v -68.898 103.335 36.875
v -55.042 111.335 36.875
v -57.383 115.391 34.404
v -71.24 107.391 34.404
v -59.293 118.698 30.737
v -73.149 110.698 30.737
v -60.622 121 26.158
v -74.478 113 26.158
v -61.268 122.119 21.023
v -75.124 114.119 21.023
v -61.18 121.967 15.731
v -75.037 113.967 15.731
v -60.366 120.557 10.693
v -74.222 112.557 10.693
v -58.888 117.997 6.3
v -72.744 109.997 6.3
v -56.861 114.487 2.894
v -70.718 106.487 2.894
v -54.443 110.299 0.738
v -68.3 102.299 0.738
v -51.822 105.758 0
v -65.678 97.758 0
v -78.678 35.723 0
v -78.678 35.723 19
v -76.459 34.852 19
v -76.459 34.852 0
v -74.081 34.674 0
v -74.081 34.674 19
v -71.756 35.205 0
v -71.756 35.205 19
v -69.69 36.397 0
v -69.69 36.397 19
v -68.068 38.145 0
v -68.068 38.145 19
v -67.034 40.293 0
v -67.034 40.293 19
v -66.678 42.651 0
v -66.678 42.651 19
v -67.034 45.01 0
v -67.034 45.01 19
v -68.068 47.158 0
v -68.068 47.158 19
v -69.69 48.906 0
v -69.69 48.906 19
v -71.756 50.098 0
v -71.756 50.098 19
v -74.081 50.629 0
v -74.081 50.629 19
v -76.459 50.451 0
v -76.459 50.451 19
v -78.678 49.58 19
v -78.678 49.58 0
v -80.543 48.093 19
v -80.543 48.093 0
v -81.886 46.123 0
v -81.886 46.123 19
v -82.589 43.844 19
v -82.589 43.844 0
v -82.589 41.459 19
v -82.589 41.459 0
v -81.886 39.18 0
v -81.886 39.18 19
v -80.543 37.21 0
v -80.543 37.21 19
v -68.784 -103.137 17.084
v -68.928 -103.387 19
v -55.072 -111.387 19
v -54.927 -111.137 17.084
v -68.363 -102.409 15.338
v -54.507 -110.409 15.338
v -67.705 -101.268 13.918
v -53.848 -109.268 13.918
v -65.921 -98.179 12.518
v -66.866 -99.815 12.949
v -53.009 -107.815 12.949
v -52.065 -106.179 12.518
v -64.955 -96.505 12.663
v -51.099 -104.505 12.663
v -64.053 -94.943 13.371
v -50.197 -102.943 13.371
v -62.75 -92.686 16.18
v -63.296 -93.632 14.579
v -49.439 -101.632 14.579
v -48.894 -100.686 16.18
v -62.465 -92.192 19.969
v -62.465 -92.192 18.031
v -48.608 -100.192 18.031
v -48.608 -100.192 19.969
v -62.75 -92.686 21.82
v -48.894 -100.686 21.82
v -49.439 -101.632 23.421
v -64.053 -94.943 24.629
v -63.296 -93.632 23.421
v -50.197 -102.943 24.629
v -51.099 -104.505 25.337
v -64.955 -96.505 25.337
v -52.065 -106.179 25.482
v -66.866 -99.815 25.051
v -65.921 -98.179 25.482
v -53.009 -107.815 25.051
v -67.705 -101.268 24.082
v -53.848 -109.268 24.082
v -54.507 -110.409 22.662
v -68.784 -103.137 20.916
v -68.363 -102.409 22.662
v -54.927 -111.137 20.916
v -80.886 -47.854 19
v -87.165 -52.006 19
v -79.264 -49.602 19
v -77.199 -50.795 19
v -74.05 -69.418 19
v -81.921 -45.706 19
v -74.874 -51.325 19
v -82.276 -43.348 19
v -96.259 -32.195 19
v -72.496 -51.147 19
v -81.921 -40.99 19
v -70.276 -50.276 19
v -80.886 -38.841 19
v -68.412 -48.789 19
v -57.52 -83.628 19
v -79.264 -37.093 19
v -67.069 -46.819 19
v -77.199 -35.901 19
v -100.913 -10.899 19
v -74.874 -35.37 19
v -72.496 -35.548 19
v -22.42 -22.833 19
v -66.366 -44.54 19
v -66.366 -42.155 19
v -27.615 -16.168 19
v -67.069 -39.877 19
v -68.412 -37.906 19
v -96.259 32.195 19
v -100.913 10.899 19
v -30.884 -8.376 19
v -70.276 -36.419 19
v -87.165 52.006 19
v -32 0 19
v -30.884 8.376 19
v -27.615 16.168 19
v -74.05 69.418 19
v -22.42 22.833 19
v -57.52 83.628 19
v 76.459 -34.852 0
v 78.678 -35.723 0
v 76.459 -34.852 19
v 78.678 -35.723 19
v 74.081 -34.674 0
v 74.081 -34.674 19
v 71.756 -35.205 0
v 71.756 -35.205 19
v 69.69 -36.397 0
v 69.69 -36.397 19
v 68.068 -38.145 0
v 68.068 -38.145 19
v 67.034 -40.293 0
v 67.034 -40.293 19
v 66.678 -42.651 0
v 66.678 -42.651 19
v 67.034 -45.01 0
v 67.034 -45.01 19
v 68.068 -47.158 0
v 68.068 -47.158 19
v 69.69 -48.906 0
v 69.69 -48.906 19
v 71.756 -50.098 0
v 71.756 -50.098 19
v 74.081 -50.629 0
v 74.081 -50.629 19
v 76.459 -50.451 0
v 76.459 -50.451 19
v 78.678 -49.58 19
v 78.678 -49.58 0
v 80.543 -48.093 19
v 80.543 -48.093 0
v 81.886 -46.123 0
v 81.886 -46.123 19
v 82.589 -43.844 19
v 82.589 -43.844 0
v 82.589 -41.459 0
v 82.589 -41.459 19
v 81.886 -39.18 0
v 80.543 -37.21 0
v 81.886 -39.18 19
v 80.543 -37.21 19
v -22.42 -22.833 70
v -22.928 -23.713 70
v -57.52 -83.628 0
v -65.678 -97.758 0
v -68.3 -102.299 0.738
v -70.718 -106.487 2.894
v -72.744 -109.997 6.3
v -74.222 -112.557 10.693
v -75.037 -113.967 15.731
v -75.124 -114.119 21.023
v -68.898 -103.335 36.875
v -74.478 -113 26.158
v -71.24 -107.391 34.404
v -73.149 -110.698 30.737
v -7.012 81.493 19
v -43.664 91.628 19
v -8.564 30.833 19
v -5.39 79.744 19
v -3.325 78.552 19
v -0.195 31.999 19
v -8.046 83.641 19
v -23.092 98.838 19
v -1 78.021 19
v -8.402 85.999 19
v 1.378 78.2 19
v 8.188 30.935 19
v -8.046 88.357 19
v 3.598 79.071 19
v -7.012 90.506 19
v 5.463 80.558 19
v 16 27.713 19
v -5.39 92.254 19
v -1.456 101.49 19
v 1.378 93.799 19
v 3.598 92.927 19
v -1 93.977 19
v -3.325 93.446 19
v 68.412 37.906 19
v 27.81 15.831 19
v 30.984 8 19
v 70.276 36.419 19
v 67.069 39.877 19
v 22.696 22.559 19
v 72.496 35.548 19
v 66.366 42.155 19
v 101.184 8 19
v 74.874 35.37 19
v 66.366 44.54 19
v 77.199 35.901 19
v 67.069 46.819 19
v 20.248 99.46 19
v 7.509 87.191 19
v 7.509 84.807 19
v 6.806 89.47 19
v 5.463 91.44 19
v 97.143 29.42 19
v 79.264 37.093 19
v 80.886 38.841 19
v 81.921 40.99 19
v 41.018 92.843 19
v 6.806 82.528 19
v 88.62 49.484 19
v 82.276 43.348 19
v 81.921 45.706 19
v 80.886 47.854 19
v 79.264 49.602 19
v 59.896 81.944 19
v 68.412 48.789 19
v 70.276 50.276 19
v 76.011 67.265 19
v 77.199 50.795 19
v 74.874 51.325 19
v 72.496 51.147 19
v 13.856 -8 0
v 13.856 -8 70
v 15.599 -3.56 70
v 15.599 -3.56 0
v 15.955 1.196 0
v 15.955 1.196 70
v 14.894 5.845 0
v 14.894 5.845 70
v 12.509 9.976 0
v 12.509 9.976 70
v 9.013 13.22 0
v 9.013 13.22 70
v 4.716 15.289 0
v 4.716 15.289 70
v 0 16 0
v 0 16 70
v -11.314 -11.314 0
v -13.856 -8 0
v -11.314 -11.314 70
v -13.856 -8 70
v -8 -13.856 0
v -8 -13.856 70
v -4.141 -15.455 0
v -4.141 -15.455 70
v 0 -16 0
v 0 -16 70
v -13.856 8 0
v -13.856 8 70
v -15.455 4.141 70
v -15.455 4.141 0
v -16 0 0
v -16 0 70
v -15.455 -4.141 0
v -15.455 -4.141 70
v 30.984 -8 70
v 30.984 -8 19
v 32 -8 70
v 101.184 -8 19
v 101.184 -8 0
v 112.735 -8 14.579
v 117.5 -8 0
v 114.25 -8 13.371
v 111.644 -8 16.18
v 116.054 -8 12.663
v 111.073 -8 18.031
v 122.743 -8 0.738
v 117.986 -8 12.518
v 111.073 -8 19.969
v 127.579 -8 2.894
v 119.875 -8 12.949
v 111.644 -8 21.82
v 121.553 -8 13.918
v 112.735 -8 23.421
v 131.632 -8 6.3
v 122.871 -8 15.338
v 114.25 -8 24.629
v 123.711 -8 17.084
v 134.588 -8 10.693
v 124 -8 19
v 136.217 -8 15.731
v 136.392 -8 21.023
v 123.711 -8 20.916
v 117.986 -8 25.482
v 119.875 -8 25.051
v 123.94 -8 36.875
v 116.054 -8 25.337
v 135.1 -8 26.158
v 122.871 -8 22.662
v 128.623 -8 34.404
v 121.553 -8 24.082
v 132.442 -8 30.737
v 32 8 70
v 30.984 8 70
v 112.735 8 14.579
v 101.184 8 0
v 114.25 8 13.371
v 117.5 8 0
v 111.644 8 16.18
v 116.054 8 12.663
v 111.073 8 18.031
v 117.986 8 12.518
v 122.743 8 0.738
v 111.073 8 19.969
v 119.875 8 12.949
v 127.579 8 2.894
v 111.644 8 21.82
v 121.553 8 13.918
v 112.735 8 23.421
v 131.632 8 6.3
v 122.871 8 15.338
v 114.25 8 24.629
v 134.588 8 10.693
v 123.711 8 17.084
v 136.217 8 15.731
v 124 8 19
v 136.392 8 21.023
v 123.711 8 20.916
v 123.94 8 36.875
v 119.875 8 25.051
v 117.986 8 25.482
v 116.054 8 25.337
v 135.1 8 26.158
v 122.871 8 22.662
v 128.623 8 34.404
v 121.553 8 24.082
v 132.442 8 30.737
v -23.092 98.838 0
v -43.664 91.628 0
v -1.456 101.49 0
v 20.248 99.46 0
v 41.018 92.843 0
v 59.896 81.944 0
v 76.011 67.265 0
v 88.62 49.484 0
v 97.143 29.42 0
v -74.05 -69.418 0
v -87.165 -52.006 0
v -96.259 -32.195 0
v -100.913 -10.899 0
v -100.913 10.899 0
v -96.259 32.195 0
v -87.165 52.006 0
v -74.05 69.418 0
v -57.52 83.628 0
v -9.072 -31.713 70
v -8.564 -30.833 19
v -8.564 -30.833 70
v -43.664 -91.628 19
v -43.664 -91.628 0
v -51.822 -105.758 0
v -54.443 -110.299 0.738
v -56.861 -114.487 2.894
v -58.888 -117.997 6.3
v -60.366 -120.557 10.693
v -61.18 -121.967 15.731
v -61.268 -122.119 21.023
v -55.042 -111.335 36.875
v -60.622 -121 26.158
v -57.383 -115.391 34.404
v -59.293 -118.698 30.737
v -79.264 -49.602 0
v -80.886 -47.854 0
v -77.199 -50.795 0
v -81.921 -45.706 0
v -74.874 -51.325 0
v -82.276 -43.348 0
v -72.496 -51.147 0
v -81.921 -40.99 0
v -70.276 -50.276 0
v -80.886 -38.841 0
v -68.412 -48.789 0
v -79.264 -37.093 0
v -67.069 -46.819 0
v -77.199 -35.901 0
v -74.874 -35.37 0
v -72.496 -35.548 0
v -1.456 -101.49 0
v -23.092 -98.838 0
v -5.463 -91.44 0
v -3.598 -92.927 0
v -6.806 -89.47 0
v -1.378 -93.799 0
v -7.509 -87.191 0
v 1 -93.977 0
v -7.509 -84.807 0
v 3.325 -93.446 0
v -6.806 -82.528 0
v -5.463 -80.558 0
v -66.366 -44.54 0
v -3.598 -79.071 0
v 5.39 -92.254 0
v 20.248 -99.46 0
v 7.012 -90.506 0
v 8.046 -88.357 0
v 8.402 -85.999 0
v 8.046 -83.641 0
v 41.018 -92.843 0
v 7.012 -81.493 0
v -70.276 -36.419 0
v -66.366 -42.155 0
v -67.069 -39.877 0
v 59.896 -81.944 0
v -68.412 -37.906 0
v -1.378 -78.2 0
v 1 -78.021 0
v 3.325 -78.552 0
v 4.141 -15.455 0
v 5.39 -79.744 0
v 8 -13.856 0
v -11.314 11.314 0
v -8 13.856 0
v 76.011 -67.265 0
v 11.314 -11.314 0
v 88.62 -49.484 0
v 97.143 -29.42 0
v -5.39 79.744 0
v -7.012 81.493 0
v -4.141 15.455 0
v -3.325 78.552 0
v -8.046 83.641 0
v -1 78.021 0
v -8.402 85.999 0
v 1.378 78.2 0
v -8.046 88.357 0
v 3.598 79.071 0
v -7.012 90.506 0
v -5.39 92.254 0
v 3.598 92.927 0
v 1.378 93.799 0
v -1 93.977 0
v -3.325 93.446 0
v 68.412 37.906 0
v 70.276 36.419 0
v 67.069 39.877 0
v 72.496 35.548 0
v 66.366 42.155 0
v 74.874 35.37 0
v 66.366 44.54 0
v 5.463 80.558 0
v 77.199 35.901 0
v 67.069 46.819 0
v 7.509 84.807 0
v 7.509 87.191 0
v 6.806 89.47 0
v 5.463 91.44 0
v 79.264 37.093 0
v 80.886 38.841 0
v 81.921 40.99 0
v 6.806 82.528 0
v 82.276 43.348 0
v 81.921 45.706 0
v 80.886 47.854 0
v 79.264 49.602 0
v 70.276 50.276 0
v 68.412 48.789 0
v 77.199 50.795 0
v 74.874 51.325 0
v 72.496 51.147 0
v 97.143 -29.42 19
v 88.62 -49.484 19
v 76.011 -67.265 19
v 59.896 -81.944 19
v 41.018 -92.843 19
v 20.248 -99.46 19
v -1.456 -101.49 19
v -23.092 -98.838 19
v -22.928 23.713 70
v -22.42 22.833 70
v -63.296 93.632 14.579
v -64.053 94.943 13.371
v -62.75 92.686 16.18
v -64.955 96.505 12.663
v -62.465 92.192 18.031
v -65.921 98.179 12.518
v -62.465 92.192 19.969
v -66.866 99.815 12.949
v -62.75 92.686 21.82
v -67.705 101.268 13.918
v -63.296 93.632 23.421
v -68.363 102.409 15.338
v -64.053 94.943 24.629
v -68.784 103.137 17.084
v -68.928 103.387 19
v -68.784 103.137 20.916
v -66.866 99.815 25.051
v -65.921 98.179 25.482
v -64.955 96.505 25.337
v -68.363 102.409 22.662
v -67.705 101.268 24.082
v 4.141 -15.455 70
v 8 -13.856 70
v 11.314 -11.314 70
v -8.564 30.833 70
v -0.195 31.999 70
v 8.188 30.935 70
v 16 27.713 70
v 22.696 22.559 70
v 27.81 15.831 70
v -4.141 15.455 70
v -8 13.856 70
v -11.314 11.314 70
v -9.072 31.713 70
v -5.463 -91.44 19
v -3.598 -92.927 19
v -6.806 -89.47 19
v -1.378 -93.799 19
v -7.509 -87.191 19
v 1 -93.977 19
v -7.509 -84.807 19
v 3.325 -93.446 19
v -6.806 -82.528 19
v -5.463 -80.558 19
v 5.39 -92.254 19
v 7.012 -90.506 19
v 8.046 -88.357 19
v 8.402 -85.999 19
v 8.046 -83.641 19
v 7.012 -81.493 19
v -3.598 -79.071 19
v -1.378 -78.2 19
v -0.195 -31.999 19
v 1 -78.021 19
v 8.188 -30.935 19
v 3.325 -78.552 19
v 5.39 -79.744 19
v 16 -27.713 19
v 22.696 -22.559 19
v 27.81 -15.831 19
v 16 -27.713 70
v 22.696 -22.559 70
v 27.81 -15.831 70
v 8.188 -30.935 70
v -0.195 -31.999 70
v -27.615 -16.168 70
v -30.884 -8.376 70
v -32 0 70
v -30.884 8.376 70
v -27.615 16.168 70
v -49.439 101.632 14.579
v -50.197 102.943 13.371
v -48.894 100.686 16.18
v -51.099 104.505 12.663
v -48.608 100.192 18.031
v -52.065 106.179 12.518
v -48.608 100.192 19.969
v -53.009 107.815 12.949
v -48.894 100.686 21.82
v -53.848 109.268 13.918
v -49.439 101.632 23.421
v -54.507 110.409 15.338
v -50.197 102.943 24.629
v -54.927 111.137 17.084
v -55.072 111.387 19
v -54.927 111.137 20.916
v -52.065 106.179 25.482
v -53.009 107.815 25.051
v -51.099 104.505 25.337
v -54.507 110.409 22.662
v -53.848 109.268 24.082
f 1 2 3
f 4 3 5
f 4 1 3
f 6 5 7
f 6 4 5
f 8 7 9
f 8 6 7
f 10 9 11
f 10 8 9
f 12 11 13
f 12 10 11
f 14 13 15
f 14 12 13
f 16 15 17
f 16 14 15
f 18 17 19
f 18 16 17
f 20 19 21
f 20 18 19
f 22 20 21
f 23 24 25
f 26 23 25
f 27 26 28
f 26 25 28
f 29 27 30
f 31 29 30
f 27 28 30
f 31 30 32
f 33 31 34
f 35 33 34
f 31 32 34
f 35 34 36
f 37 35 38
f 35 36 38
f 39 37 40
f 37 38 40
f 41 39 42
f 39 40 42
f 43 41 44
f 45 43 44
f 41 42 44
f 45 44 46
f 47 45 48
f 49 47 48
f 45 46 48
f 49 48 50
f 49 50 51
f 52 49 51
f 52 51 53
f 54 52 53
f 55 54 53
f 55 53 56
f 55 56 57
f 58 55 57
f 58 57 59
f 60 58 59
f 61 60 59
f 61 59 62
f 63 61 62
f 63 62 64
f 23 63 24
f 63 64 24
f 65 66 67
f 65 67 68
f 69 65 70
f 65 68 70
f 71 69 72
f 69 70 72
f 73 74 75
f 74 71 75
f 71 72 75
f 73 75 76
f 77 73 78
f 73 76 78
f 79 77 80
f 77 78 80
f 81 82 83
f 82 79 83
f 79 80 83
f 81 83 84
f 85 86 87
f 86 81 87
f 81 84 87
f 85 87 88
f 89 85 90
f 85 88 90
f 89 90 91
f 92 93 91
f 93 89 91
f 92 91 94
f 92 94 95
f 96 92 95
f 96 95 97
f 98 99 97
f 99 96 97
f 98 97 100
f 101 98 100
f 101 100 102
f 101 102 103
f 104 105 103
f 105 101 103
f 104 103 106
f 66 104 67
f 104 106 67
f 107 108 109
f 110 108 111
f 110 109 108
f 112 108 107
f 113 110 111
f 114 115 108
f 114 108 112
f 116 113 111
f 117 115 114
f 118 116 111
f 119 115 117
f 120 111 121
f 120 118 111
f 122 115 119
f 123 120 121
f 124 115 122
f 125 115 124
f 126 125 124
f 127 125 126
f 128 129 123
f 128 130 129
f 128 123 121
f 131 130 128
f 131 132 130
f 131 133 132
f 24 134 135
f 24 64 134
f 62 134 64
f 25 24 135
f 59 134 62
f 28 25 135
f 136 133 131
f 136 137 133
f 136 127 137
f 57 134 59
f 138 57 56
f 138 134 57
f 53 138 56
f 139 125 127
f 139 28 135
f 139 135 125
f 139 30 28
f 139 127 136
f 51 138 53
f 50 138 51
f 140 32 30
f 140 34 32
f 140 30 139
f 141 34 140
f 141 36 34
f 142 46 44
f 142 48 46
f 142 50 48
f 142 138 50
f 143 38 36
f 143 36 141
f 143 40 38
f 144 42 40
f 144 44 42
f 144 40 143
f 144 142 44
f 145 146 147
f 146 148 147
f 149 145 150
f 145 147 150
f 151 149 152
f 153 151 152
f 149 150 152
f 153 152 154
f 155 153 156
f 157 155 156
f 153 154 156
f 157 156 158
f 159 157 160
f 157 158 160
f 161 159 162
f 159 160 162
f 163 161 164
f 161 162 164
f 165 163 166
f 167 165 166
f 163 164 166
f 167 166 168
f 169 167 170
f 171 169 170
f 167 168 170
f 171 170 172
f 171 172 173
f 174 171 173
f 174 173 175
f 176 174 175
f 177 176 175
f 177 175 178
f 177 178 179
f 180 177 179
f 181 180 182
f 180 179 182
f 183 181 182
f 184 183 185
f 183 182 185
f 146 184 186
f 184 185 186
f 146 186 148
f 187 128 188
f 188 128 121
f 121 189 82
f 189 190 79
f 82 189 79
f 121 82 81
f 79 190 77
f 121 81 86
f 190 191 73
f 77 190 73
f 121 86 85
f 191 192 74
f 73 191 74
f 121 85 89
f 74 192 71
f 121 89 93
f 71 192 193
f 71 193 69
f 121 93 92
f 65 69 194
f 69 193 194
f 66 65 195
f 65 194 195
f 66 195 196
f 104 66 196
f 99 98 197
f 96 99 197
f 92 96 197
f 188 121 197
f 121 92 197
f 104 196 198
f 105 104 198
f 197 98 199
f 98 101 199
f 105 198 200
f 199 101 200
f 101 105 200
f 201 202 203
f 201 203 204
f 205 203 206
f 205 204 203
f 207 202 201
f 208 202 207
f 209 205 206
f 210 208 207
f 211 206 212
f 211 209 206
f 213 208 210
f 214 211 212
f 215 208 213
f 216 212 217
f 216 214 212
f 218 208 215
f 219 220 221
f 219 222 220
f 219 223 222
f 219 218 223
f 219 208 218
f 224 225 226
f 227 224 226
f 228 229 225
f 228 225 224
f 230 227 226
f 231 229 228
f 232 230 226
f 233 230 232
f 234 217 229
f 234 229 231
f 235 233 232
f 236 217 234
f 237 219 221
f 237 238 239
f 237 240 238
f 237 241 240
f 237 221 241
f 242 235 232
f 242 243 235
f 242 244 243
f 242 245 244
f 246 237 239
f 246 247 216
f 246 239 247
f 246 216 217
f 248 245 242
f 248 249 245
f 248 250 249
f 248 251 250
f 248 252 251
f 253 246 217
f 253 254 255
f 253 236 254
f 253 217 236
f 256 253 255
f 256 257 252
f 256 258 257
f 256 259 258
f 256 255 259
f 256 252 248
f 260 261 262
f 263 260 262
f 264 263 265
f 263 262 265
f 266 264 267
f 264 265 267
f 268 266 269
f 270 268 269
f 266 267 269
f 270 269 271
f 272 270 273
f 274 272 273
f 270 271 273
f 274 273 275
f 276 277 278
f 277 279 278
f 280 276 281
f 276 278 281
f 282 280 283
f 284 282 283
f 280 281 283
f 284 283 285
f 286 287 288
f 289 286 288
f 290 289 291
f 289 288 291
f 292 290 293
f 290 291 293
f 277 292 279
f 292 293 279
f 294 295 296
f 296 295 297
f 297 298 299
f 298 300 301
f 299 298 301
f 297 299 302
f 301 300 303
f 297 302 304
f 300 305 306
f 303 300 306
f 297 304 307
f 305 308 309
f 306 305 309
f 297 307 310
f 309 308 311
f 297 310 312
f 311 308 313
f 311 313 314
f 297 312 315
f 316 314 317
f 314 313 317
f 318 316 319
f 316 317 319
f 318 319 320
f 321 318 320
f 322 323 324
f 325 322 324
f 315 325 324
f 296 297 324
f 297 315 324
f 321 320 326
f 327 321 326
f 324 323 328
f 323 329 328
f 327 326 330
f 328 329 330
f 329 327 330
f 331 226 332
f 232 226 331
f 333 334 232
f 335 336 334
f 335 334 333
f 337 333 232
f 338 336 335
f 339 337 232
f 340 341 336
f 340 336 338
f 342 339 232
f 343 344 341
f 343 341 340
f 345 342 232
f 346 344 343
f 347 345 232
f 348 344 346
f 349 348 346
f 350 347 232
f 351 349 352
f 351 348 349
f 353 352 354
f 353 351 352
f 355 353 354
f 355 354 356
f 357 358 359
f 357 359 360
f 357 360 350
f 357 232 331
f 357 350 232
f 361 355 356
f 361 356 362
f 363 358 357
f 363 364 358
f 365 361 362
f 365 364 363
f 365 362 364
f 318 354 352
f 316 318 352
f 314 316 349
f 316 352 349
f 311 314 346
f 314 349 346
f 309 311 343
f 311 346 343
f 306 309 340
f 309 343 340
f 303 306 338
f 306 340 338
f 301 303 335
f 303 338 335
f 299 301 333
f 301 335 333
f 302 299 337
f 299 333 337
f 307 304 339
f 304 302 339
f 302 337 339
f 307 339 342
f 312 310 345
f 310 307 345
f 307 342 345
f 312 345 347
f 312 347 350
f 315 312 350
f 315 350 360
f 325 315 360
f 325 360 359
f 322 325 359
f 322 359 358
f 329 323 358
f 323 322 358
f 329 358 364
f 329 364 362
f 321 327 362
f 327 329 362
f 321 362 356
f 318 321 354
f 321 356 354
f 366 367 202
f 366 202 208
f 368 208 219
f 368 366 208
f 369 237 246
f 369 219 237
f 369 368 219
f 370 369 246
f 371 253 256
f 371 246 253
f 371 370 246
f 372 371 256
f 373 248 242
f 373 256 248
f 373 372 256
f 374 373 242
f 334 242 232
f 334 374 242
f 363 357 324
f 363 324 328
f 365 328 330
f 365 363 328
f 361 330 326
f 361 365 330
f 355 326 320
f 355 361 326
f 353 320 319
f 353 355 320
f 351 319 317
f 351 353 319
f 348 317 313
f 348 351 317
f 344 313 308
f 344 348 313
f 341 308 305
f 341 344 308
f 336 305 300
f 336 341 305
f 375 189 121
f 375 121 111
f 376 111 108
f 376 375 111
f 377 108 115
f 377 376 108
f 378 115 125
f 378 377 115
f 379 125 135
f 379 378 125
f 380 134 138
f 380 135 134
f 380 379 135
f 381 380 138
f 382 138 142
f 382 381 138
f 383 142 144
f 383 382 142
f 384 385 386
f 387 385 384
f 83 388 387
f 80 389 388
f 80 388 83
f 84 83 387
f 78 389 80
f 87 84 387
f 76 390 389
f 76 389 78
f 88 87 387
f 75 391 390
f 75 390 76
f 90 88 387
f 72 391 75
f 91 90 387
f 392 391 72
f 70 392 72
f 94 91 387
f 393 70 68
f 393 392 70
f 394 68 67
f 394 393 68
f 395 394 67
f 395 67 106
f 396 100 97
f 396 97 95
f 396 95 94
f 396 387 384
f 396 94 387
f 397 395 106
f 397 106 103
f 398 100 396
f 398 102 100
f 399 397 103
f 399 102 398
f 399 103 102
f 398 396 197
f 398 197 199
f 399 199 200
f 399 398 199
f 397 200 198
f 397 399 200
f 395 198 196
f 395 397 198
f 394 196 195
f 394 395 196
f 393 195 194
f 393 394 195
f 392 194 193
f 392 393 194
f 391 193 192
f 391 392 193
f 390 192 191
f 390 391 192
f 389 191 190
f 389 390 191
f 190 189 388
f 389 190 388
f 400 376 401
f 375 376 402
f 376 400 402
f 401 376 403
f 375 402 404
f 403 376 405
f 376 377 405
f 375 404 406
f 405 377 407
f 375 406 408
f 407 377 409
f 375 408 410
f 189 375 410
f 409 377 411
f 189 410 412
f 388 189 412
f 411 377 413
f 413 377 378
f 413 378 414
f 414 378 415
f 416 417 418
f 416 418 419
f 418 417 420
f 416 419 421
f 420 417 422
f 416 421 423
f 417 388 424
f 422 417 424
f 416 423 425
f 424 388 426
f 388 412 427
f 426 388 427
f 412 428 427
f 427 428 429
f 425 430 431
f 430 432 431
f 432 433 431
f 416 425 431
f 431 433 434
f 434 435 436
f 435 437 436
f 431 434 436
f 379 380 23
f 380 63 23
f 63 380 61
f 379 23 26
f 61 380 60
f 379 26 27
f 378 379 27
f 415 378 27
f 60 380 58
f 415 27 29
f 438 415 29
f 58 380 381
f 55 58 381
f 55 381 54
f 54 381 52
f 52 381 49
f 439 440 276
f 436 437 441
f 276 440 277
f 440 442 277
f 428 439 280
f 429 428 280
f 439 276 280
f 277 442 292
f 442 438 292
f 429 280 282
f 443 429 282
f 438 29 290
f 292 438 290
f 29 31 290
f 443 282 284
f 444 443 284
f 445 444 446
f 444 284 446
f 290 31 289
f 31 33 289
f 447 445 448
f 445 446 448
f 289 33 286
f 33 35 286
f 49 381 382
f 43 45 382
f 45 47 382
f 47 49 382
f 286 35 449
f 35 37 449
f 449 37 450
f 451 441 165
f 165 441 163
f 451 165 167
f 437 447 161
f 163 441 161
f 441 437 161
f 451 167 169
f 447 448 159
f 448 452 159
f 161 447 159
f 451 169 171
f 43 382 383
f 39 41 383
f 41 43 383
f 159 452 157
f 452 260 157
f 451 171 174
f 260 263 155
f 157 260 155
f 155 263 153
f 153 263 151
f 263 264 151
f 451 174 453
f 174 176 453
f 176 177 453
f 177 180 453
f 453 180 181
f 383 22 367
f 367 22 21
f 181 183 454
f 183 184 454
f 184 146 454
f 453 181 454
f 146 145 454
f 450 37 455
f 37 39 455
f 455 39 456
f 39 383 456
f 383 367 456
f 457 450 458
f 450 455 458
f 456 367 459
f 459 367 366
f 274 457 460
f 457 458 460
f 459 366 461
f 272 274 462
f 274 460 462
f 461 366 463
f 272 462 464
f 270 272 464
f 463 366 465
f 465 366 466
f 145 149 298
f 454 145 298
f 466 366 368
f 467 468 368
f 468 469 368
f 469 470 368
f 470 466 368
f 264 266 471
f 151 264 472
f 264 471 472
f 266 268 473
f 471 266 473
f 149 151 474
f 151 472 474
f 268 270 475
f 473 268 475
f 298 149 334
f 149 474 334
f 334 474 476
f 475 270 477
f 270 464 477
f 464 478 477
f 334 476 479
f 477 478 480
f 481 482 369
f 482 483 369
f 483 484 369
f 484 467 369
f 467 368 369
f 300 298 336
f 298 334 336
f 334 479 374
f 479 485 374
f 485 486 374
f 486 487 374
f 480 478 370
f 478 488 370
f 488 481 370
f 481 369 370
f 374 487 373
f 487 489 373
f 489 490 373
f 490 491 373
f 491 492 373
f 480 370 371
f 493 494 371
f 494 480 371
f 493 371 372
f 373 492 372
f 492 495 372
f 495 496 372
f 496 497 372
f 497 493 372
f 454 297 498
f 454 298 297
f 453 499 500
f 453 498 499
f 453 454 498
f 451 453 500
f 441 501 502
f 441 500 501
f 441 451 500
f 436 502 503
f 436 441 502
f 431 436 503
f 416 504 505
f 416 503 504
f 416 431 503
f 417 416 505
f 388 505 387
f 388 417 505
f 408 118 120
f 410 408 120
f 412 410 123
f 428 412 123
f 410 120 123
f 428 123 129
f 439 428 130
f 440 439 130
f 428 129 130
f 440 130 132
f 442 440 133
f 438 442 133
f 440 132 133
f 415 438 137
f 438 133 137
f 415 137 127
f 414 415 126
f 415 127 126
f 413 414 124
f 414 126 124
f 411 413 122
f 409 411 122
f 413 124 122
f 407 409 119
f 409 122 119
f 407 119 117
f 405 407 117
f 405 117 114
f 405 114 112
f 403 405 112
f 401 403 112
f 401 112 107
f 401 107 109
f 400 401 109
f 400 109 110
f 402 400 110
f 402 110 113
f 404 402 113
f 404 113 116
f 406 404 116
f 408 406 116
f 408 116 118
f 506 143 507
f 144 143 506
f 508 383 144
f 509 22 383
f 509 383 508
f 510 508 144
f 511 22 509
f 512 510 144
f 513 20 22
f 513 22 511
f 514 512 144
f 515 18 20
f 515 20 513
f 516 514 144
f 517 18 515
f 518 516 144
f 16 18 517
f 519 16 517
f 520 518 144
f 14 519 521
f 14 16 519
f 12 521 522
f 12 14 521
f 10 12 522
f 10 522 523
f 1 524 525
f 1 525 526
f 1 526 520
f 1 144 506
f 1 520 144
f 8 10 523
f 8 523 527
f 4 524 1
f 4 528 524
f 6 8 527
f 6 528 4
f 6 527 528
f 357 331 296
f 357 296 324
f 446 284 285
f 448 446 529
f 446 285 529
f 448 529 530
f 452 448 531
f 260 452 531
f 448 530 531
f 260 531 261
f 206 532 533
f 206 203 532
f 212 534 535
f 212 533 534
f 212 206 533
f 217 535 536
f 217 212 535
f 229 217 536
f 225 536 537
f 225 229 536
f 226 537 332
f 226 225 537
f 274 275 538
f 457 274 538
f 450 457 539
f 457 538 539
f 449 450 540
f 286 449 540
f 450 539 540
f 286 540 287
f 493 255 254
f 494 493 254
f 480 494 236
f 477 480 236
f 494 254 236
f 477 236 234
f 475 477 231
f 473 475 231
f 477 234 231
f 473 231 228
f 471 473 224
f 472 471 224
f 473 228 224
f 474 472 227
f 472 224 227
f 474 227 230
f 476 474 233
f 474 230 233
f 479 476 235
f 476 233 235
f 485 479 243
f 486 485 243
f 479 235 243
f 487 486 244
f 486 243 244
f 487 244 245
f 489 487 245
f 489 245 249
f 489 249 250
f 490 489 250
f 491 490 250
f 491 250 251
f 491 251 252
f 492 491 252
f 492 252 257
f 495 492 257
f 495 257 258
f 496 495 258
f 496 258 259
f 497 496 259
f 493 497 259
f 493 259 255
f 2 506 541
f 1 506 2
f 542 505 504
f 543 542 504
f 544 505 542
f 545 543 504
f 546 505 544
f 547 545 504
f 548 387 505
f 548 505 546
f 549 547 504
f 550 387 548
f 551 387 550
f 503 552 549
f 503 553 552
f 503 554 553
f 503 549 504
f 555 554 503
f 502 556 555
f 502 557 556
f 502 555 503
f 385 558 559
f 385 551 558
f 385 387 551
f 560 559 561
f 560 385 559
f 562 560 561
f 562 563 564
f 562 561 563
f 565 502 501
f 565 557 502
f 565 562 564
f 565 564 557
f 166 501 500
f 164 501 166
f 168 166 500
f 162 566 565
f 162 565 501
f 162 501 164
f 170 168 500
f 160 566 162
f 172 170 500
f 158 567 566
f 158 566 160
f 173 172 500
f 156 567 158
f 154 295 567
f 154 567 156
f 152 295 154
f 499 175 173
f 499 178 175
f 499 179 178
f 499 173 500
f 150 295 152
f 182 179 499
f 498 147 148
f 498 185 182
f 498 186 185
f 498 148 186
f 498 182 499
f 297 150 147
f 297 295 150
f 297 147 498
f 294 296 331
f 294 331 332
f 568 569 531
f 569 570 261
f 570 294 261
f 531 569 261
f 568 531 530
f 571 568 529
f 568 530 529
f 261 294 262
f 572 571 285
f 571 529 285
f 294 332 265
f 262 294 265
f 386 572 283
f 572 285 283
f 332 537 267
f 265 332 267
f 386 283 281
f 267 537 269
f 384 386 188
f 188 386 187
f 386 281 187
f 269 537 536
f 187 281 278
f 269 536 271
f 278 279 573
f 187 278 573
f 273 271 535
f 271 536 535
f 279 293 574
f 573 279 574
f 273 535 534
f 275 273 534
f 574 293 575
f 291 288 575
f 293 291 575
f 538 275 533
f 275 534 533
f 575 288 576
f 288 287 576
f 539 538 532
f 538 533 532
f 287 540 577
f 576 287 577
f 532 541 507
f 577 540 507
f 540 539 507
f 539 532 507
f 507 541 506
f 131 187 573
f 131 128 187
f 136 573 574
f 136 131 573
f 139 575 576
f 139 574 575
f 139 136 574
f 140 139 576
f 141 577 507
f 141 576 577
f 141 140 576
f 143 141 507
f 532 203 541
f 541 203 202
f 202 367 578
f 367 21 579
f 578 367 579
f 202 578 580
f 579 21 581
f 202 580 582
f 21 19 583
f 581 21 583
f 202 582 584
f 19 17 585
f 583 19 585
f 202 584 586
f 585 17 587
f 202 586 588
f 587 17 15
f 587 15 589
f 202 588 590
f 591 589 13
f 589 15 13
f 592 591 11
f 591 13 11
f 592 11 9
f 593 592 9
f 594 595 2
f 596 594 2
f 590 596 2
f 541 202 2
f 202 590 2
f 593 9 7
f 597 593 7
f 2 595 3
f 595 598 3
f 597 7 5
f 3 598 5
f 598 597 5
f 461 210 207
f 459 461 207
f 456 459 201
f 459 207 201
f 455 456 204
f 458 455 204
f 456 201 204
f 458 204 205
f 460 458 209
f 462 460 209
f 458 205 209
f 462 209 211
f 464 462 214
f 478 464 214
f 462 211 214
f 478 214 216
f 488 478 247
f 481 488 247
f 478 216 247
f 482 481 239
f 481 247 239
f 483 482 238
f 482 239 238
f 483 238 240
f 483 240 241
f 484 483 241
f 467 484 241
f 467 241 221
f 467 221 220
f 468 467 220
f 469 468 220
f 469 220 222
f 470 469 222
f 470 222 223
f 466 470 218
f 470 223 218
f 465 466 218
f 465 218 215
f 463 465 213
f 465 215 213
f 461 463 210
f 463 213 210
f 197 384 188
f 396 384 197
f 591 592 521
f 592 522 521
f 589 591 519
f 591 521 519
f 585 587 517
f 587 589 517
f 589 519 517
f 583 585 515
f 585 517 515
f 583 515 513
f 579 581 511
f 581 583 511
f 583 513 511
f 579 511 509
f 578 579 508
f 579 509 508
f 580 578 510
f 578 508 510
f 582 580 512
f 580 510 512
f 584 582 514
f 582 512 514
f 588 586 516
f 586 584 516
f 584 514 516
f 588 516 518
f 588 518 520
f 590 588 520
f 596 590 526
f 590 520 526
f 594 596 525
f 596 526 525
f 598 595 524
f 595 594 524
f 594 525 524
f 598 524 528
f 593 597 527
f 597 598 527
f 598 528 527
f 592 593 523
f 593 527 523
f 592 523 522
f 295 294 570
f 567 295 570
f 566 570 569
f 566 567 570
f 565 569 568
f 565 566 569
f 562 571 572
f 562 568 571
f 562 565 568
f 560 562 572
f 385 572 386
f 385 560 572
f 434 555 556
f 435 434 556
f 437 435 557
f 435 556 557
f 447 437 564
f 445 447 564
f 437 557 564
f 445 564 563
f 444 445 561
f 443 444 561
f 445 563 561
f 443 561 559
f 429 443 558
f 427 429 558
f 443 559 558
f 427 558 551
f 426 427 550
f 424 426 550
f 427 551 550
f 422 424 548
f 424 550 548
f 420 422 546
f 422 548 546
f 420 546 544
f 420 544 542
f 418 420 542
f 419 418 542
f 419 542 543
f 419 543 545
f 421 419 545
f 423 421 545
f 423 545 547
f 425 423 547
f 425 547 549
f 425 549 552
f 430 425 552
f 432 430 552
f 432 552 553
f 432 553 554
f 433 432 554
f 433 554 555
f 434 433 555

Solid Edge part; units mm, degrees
sketch "Sketch1" plane through (0, 0, 0) normal (0, 0, 1) x (1, 0, 0)
  circle A0 centre (0, 0) radius 101.5
extrude "Protrusion1" add sketch "Sketch1" along normal blind 19
sketch "Sketch2" plane through (0, 0, 19) normal (0, 0, 1) x (1, 0, 0)
  circle A0 centre (0.4019, -85.9991) radius 8
extrude "ExtrudedCutout_1" cut sketch "Sketch2" along normal mid plane 72.3819
pattern_circular "Pattern1" count 6 over 360 about axis through (0, 0, 19) along (0, 0, -1) of "ExtrudedCutout_1"
sketch "Sketch3" plane through (0, 0, 19) normal (0, 0, 1) x (1, 0, 0)
  circle A0 centre (0, 0) radius 32
extrude "ExtrudedProtrusion_3" add sketch "Sketch3" along normal blind 51
sketch "Sketch4" plane through (0, 0, 70) normal (0, 0, 1) x (0, 1, 0)
  circle A0 centre (0, 0) radius 16
extrude "ExtrudedCutout_3" cut sketch "Sketch4" along normal mid plane 382.6362
sketch "Sketch5" plane through (0, 0, 0) normal (0, -1, 0) x (1, 0, 0)
  line L0 (32, 70) -> (123.9402, 36.8752)
  line L1 (101.5, 0) -> (117.5, 0)
  line L2 (0, 0) -> (101.5, 0)
  line L3 (0, 70) -> (0, 0)
  line L4 (32, 70) -> (0, 70)
  arc A0 (123.9402, 36.8752) -> (117.5, 0) centre (117.5, 19) cw
  circle A1 centre (117.5, 19) radius 6.5
extrude "ExtrudedProtrusion_6" add sketch "Sketch5" along normal mid plane 16
pattern_circular "Pattern3" count 3 over 360 about axis through (0, 0, 19) along (0, 0, -1) of "ExtrudedProtrusion_6"
sketch "Sketch6" plane through (0, 0, 70) normal (0, 0, 1) x (0, 1, 0)
  circle A0 centre (0, 0) radius 16
extrude "ExtrudedCutout_4" cut sketch "Sketch6" along normal mid plane 1270.4141
